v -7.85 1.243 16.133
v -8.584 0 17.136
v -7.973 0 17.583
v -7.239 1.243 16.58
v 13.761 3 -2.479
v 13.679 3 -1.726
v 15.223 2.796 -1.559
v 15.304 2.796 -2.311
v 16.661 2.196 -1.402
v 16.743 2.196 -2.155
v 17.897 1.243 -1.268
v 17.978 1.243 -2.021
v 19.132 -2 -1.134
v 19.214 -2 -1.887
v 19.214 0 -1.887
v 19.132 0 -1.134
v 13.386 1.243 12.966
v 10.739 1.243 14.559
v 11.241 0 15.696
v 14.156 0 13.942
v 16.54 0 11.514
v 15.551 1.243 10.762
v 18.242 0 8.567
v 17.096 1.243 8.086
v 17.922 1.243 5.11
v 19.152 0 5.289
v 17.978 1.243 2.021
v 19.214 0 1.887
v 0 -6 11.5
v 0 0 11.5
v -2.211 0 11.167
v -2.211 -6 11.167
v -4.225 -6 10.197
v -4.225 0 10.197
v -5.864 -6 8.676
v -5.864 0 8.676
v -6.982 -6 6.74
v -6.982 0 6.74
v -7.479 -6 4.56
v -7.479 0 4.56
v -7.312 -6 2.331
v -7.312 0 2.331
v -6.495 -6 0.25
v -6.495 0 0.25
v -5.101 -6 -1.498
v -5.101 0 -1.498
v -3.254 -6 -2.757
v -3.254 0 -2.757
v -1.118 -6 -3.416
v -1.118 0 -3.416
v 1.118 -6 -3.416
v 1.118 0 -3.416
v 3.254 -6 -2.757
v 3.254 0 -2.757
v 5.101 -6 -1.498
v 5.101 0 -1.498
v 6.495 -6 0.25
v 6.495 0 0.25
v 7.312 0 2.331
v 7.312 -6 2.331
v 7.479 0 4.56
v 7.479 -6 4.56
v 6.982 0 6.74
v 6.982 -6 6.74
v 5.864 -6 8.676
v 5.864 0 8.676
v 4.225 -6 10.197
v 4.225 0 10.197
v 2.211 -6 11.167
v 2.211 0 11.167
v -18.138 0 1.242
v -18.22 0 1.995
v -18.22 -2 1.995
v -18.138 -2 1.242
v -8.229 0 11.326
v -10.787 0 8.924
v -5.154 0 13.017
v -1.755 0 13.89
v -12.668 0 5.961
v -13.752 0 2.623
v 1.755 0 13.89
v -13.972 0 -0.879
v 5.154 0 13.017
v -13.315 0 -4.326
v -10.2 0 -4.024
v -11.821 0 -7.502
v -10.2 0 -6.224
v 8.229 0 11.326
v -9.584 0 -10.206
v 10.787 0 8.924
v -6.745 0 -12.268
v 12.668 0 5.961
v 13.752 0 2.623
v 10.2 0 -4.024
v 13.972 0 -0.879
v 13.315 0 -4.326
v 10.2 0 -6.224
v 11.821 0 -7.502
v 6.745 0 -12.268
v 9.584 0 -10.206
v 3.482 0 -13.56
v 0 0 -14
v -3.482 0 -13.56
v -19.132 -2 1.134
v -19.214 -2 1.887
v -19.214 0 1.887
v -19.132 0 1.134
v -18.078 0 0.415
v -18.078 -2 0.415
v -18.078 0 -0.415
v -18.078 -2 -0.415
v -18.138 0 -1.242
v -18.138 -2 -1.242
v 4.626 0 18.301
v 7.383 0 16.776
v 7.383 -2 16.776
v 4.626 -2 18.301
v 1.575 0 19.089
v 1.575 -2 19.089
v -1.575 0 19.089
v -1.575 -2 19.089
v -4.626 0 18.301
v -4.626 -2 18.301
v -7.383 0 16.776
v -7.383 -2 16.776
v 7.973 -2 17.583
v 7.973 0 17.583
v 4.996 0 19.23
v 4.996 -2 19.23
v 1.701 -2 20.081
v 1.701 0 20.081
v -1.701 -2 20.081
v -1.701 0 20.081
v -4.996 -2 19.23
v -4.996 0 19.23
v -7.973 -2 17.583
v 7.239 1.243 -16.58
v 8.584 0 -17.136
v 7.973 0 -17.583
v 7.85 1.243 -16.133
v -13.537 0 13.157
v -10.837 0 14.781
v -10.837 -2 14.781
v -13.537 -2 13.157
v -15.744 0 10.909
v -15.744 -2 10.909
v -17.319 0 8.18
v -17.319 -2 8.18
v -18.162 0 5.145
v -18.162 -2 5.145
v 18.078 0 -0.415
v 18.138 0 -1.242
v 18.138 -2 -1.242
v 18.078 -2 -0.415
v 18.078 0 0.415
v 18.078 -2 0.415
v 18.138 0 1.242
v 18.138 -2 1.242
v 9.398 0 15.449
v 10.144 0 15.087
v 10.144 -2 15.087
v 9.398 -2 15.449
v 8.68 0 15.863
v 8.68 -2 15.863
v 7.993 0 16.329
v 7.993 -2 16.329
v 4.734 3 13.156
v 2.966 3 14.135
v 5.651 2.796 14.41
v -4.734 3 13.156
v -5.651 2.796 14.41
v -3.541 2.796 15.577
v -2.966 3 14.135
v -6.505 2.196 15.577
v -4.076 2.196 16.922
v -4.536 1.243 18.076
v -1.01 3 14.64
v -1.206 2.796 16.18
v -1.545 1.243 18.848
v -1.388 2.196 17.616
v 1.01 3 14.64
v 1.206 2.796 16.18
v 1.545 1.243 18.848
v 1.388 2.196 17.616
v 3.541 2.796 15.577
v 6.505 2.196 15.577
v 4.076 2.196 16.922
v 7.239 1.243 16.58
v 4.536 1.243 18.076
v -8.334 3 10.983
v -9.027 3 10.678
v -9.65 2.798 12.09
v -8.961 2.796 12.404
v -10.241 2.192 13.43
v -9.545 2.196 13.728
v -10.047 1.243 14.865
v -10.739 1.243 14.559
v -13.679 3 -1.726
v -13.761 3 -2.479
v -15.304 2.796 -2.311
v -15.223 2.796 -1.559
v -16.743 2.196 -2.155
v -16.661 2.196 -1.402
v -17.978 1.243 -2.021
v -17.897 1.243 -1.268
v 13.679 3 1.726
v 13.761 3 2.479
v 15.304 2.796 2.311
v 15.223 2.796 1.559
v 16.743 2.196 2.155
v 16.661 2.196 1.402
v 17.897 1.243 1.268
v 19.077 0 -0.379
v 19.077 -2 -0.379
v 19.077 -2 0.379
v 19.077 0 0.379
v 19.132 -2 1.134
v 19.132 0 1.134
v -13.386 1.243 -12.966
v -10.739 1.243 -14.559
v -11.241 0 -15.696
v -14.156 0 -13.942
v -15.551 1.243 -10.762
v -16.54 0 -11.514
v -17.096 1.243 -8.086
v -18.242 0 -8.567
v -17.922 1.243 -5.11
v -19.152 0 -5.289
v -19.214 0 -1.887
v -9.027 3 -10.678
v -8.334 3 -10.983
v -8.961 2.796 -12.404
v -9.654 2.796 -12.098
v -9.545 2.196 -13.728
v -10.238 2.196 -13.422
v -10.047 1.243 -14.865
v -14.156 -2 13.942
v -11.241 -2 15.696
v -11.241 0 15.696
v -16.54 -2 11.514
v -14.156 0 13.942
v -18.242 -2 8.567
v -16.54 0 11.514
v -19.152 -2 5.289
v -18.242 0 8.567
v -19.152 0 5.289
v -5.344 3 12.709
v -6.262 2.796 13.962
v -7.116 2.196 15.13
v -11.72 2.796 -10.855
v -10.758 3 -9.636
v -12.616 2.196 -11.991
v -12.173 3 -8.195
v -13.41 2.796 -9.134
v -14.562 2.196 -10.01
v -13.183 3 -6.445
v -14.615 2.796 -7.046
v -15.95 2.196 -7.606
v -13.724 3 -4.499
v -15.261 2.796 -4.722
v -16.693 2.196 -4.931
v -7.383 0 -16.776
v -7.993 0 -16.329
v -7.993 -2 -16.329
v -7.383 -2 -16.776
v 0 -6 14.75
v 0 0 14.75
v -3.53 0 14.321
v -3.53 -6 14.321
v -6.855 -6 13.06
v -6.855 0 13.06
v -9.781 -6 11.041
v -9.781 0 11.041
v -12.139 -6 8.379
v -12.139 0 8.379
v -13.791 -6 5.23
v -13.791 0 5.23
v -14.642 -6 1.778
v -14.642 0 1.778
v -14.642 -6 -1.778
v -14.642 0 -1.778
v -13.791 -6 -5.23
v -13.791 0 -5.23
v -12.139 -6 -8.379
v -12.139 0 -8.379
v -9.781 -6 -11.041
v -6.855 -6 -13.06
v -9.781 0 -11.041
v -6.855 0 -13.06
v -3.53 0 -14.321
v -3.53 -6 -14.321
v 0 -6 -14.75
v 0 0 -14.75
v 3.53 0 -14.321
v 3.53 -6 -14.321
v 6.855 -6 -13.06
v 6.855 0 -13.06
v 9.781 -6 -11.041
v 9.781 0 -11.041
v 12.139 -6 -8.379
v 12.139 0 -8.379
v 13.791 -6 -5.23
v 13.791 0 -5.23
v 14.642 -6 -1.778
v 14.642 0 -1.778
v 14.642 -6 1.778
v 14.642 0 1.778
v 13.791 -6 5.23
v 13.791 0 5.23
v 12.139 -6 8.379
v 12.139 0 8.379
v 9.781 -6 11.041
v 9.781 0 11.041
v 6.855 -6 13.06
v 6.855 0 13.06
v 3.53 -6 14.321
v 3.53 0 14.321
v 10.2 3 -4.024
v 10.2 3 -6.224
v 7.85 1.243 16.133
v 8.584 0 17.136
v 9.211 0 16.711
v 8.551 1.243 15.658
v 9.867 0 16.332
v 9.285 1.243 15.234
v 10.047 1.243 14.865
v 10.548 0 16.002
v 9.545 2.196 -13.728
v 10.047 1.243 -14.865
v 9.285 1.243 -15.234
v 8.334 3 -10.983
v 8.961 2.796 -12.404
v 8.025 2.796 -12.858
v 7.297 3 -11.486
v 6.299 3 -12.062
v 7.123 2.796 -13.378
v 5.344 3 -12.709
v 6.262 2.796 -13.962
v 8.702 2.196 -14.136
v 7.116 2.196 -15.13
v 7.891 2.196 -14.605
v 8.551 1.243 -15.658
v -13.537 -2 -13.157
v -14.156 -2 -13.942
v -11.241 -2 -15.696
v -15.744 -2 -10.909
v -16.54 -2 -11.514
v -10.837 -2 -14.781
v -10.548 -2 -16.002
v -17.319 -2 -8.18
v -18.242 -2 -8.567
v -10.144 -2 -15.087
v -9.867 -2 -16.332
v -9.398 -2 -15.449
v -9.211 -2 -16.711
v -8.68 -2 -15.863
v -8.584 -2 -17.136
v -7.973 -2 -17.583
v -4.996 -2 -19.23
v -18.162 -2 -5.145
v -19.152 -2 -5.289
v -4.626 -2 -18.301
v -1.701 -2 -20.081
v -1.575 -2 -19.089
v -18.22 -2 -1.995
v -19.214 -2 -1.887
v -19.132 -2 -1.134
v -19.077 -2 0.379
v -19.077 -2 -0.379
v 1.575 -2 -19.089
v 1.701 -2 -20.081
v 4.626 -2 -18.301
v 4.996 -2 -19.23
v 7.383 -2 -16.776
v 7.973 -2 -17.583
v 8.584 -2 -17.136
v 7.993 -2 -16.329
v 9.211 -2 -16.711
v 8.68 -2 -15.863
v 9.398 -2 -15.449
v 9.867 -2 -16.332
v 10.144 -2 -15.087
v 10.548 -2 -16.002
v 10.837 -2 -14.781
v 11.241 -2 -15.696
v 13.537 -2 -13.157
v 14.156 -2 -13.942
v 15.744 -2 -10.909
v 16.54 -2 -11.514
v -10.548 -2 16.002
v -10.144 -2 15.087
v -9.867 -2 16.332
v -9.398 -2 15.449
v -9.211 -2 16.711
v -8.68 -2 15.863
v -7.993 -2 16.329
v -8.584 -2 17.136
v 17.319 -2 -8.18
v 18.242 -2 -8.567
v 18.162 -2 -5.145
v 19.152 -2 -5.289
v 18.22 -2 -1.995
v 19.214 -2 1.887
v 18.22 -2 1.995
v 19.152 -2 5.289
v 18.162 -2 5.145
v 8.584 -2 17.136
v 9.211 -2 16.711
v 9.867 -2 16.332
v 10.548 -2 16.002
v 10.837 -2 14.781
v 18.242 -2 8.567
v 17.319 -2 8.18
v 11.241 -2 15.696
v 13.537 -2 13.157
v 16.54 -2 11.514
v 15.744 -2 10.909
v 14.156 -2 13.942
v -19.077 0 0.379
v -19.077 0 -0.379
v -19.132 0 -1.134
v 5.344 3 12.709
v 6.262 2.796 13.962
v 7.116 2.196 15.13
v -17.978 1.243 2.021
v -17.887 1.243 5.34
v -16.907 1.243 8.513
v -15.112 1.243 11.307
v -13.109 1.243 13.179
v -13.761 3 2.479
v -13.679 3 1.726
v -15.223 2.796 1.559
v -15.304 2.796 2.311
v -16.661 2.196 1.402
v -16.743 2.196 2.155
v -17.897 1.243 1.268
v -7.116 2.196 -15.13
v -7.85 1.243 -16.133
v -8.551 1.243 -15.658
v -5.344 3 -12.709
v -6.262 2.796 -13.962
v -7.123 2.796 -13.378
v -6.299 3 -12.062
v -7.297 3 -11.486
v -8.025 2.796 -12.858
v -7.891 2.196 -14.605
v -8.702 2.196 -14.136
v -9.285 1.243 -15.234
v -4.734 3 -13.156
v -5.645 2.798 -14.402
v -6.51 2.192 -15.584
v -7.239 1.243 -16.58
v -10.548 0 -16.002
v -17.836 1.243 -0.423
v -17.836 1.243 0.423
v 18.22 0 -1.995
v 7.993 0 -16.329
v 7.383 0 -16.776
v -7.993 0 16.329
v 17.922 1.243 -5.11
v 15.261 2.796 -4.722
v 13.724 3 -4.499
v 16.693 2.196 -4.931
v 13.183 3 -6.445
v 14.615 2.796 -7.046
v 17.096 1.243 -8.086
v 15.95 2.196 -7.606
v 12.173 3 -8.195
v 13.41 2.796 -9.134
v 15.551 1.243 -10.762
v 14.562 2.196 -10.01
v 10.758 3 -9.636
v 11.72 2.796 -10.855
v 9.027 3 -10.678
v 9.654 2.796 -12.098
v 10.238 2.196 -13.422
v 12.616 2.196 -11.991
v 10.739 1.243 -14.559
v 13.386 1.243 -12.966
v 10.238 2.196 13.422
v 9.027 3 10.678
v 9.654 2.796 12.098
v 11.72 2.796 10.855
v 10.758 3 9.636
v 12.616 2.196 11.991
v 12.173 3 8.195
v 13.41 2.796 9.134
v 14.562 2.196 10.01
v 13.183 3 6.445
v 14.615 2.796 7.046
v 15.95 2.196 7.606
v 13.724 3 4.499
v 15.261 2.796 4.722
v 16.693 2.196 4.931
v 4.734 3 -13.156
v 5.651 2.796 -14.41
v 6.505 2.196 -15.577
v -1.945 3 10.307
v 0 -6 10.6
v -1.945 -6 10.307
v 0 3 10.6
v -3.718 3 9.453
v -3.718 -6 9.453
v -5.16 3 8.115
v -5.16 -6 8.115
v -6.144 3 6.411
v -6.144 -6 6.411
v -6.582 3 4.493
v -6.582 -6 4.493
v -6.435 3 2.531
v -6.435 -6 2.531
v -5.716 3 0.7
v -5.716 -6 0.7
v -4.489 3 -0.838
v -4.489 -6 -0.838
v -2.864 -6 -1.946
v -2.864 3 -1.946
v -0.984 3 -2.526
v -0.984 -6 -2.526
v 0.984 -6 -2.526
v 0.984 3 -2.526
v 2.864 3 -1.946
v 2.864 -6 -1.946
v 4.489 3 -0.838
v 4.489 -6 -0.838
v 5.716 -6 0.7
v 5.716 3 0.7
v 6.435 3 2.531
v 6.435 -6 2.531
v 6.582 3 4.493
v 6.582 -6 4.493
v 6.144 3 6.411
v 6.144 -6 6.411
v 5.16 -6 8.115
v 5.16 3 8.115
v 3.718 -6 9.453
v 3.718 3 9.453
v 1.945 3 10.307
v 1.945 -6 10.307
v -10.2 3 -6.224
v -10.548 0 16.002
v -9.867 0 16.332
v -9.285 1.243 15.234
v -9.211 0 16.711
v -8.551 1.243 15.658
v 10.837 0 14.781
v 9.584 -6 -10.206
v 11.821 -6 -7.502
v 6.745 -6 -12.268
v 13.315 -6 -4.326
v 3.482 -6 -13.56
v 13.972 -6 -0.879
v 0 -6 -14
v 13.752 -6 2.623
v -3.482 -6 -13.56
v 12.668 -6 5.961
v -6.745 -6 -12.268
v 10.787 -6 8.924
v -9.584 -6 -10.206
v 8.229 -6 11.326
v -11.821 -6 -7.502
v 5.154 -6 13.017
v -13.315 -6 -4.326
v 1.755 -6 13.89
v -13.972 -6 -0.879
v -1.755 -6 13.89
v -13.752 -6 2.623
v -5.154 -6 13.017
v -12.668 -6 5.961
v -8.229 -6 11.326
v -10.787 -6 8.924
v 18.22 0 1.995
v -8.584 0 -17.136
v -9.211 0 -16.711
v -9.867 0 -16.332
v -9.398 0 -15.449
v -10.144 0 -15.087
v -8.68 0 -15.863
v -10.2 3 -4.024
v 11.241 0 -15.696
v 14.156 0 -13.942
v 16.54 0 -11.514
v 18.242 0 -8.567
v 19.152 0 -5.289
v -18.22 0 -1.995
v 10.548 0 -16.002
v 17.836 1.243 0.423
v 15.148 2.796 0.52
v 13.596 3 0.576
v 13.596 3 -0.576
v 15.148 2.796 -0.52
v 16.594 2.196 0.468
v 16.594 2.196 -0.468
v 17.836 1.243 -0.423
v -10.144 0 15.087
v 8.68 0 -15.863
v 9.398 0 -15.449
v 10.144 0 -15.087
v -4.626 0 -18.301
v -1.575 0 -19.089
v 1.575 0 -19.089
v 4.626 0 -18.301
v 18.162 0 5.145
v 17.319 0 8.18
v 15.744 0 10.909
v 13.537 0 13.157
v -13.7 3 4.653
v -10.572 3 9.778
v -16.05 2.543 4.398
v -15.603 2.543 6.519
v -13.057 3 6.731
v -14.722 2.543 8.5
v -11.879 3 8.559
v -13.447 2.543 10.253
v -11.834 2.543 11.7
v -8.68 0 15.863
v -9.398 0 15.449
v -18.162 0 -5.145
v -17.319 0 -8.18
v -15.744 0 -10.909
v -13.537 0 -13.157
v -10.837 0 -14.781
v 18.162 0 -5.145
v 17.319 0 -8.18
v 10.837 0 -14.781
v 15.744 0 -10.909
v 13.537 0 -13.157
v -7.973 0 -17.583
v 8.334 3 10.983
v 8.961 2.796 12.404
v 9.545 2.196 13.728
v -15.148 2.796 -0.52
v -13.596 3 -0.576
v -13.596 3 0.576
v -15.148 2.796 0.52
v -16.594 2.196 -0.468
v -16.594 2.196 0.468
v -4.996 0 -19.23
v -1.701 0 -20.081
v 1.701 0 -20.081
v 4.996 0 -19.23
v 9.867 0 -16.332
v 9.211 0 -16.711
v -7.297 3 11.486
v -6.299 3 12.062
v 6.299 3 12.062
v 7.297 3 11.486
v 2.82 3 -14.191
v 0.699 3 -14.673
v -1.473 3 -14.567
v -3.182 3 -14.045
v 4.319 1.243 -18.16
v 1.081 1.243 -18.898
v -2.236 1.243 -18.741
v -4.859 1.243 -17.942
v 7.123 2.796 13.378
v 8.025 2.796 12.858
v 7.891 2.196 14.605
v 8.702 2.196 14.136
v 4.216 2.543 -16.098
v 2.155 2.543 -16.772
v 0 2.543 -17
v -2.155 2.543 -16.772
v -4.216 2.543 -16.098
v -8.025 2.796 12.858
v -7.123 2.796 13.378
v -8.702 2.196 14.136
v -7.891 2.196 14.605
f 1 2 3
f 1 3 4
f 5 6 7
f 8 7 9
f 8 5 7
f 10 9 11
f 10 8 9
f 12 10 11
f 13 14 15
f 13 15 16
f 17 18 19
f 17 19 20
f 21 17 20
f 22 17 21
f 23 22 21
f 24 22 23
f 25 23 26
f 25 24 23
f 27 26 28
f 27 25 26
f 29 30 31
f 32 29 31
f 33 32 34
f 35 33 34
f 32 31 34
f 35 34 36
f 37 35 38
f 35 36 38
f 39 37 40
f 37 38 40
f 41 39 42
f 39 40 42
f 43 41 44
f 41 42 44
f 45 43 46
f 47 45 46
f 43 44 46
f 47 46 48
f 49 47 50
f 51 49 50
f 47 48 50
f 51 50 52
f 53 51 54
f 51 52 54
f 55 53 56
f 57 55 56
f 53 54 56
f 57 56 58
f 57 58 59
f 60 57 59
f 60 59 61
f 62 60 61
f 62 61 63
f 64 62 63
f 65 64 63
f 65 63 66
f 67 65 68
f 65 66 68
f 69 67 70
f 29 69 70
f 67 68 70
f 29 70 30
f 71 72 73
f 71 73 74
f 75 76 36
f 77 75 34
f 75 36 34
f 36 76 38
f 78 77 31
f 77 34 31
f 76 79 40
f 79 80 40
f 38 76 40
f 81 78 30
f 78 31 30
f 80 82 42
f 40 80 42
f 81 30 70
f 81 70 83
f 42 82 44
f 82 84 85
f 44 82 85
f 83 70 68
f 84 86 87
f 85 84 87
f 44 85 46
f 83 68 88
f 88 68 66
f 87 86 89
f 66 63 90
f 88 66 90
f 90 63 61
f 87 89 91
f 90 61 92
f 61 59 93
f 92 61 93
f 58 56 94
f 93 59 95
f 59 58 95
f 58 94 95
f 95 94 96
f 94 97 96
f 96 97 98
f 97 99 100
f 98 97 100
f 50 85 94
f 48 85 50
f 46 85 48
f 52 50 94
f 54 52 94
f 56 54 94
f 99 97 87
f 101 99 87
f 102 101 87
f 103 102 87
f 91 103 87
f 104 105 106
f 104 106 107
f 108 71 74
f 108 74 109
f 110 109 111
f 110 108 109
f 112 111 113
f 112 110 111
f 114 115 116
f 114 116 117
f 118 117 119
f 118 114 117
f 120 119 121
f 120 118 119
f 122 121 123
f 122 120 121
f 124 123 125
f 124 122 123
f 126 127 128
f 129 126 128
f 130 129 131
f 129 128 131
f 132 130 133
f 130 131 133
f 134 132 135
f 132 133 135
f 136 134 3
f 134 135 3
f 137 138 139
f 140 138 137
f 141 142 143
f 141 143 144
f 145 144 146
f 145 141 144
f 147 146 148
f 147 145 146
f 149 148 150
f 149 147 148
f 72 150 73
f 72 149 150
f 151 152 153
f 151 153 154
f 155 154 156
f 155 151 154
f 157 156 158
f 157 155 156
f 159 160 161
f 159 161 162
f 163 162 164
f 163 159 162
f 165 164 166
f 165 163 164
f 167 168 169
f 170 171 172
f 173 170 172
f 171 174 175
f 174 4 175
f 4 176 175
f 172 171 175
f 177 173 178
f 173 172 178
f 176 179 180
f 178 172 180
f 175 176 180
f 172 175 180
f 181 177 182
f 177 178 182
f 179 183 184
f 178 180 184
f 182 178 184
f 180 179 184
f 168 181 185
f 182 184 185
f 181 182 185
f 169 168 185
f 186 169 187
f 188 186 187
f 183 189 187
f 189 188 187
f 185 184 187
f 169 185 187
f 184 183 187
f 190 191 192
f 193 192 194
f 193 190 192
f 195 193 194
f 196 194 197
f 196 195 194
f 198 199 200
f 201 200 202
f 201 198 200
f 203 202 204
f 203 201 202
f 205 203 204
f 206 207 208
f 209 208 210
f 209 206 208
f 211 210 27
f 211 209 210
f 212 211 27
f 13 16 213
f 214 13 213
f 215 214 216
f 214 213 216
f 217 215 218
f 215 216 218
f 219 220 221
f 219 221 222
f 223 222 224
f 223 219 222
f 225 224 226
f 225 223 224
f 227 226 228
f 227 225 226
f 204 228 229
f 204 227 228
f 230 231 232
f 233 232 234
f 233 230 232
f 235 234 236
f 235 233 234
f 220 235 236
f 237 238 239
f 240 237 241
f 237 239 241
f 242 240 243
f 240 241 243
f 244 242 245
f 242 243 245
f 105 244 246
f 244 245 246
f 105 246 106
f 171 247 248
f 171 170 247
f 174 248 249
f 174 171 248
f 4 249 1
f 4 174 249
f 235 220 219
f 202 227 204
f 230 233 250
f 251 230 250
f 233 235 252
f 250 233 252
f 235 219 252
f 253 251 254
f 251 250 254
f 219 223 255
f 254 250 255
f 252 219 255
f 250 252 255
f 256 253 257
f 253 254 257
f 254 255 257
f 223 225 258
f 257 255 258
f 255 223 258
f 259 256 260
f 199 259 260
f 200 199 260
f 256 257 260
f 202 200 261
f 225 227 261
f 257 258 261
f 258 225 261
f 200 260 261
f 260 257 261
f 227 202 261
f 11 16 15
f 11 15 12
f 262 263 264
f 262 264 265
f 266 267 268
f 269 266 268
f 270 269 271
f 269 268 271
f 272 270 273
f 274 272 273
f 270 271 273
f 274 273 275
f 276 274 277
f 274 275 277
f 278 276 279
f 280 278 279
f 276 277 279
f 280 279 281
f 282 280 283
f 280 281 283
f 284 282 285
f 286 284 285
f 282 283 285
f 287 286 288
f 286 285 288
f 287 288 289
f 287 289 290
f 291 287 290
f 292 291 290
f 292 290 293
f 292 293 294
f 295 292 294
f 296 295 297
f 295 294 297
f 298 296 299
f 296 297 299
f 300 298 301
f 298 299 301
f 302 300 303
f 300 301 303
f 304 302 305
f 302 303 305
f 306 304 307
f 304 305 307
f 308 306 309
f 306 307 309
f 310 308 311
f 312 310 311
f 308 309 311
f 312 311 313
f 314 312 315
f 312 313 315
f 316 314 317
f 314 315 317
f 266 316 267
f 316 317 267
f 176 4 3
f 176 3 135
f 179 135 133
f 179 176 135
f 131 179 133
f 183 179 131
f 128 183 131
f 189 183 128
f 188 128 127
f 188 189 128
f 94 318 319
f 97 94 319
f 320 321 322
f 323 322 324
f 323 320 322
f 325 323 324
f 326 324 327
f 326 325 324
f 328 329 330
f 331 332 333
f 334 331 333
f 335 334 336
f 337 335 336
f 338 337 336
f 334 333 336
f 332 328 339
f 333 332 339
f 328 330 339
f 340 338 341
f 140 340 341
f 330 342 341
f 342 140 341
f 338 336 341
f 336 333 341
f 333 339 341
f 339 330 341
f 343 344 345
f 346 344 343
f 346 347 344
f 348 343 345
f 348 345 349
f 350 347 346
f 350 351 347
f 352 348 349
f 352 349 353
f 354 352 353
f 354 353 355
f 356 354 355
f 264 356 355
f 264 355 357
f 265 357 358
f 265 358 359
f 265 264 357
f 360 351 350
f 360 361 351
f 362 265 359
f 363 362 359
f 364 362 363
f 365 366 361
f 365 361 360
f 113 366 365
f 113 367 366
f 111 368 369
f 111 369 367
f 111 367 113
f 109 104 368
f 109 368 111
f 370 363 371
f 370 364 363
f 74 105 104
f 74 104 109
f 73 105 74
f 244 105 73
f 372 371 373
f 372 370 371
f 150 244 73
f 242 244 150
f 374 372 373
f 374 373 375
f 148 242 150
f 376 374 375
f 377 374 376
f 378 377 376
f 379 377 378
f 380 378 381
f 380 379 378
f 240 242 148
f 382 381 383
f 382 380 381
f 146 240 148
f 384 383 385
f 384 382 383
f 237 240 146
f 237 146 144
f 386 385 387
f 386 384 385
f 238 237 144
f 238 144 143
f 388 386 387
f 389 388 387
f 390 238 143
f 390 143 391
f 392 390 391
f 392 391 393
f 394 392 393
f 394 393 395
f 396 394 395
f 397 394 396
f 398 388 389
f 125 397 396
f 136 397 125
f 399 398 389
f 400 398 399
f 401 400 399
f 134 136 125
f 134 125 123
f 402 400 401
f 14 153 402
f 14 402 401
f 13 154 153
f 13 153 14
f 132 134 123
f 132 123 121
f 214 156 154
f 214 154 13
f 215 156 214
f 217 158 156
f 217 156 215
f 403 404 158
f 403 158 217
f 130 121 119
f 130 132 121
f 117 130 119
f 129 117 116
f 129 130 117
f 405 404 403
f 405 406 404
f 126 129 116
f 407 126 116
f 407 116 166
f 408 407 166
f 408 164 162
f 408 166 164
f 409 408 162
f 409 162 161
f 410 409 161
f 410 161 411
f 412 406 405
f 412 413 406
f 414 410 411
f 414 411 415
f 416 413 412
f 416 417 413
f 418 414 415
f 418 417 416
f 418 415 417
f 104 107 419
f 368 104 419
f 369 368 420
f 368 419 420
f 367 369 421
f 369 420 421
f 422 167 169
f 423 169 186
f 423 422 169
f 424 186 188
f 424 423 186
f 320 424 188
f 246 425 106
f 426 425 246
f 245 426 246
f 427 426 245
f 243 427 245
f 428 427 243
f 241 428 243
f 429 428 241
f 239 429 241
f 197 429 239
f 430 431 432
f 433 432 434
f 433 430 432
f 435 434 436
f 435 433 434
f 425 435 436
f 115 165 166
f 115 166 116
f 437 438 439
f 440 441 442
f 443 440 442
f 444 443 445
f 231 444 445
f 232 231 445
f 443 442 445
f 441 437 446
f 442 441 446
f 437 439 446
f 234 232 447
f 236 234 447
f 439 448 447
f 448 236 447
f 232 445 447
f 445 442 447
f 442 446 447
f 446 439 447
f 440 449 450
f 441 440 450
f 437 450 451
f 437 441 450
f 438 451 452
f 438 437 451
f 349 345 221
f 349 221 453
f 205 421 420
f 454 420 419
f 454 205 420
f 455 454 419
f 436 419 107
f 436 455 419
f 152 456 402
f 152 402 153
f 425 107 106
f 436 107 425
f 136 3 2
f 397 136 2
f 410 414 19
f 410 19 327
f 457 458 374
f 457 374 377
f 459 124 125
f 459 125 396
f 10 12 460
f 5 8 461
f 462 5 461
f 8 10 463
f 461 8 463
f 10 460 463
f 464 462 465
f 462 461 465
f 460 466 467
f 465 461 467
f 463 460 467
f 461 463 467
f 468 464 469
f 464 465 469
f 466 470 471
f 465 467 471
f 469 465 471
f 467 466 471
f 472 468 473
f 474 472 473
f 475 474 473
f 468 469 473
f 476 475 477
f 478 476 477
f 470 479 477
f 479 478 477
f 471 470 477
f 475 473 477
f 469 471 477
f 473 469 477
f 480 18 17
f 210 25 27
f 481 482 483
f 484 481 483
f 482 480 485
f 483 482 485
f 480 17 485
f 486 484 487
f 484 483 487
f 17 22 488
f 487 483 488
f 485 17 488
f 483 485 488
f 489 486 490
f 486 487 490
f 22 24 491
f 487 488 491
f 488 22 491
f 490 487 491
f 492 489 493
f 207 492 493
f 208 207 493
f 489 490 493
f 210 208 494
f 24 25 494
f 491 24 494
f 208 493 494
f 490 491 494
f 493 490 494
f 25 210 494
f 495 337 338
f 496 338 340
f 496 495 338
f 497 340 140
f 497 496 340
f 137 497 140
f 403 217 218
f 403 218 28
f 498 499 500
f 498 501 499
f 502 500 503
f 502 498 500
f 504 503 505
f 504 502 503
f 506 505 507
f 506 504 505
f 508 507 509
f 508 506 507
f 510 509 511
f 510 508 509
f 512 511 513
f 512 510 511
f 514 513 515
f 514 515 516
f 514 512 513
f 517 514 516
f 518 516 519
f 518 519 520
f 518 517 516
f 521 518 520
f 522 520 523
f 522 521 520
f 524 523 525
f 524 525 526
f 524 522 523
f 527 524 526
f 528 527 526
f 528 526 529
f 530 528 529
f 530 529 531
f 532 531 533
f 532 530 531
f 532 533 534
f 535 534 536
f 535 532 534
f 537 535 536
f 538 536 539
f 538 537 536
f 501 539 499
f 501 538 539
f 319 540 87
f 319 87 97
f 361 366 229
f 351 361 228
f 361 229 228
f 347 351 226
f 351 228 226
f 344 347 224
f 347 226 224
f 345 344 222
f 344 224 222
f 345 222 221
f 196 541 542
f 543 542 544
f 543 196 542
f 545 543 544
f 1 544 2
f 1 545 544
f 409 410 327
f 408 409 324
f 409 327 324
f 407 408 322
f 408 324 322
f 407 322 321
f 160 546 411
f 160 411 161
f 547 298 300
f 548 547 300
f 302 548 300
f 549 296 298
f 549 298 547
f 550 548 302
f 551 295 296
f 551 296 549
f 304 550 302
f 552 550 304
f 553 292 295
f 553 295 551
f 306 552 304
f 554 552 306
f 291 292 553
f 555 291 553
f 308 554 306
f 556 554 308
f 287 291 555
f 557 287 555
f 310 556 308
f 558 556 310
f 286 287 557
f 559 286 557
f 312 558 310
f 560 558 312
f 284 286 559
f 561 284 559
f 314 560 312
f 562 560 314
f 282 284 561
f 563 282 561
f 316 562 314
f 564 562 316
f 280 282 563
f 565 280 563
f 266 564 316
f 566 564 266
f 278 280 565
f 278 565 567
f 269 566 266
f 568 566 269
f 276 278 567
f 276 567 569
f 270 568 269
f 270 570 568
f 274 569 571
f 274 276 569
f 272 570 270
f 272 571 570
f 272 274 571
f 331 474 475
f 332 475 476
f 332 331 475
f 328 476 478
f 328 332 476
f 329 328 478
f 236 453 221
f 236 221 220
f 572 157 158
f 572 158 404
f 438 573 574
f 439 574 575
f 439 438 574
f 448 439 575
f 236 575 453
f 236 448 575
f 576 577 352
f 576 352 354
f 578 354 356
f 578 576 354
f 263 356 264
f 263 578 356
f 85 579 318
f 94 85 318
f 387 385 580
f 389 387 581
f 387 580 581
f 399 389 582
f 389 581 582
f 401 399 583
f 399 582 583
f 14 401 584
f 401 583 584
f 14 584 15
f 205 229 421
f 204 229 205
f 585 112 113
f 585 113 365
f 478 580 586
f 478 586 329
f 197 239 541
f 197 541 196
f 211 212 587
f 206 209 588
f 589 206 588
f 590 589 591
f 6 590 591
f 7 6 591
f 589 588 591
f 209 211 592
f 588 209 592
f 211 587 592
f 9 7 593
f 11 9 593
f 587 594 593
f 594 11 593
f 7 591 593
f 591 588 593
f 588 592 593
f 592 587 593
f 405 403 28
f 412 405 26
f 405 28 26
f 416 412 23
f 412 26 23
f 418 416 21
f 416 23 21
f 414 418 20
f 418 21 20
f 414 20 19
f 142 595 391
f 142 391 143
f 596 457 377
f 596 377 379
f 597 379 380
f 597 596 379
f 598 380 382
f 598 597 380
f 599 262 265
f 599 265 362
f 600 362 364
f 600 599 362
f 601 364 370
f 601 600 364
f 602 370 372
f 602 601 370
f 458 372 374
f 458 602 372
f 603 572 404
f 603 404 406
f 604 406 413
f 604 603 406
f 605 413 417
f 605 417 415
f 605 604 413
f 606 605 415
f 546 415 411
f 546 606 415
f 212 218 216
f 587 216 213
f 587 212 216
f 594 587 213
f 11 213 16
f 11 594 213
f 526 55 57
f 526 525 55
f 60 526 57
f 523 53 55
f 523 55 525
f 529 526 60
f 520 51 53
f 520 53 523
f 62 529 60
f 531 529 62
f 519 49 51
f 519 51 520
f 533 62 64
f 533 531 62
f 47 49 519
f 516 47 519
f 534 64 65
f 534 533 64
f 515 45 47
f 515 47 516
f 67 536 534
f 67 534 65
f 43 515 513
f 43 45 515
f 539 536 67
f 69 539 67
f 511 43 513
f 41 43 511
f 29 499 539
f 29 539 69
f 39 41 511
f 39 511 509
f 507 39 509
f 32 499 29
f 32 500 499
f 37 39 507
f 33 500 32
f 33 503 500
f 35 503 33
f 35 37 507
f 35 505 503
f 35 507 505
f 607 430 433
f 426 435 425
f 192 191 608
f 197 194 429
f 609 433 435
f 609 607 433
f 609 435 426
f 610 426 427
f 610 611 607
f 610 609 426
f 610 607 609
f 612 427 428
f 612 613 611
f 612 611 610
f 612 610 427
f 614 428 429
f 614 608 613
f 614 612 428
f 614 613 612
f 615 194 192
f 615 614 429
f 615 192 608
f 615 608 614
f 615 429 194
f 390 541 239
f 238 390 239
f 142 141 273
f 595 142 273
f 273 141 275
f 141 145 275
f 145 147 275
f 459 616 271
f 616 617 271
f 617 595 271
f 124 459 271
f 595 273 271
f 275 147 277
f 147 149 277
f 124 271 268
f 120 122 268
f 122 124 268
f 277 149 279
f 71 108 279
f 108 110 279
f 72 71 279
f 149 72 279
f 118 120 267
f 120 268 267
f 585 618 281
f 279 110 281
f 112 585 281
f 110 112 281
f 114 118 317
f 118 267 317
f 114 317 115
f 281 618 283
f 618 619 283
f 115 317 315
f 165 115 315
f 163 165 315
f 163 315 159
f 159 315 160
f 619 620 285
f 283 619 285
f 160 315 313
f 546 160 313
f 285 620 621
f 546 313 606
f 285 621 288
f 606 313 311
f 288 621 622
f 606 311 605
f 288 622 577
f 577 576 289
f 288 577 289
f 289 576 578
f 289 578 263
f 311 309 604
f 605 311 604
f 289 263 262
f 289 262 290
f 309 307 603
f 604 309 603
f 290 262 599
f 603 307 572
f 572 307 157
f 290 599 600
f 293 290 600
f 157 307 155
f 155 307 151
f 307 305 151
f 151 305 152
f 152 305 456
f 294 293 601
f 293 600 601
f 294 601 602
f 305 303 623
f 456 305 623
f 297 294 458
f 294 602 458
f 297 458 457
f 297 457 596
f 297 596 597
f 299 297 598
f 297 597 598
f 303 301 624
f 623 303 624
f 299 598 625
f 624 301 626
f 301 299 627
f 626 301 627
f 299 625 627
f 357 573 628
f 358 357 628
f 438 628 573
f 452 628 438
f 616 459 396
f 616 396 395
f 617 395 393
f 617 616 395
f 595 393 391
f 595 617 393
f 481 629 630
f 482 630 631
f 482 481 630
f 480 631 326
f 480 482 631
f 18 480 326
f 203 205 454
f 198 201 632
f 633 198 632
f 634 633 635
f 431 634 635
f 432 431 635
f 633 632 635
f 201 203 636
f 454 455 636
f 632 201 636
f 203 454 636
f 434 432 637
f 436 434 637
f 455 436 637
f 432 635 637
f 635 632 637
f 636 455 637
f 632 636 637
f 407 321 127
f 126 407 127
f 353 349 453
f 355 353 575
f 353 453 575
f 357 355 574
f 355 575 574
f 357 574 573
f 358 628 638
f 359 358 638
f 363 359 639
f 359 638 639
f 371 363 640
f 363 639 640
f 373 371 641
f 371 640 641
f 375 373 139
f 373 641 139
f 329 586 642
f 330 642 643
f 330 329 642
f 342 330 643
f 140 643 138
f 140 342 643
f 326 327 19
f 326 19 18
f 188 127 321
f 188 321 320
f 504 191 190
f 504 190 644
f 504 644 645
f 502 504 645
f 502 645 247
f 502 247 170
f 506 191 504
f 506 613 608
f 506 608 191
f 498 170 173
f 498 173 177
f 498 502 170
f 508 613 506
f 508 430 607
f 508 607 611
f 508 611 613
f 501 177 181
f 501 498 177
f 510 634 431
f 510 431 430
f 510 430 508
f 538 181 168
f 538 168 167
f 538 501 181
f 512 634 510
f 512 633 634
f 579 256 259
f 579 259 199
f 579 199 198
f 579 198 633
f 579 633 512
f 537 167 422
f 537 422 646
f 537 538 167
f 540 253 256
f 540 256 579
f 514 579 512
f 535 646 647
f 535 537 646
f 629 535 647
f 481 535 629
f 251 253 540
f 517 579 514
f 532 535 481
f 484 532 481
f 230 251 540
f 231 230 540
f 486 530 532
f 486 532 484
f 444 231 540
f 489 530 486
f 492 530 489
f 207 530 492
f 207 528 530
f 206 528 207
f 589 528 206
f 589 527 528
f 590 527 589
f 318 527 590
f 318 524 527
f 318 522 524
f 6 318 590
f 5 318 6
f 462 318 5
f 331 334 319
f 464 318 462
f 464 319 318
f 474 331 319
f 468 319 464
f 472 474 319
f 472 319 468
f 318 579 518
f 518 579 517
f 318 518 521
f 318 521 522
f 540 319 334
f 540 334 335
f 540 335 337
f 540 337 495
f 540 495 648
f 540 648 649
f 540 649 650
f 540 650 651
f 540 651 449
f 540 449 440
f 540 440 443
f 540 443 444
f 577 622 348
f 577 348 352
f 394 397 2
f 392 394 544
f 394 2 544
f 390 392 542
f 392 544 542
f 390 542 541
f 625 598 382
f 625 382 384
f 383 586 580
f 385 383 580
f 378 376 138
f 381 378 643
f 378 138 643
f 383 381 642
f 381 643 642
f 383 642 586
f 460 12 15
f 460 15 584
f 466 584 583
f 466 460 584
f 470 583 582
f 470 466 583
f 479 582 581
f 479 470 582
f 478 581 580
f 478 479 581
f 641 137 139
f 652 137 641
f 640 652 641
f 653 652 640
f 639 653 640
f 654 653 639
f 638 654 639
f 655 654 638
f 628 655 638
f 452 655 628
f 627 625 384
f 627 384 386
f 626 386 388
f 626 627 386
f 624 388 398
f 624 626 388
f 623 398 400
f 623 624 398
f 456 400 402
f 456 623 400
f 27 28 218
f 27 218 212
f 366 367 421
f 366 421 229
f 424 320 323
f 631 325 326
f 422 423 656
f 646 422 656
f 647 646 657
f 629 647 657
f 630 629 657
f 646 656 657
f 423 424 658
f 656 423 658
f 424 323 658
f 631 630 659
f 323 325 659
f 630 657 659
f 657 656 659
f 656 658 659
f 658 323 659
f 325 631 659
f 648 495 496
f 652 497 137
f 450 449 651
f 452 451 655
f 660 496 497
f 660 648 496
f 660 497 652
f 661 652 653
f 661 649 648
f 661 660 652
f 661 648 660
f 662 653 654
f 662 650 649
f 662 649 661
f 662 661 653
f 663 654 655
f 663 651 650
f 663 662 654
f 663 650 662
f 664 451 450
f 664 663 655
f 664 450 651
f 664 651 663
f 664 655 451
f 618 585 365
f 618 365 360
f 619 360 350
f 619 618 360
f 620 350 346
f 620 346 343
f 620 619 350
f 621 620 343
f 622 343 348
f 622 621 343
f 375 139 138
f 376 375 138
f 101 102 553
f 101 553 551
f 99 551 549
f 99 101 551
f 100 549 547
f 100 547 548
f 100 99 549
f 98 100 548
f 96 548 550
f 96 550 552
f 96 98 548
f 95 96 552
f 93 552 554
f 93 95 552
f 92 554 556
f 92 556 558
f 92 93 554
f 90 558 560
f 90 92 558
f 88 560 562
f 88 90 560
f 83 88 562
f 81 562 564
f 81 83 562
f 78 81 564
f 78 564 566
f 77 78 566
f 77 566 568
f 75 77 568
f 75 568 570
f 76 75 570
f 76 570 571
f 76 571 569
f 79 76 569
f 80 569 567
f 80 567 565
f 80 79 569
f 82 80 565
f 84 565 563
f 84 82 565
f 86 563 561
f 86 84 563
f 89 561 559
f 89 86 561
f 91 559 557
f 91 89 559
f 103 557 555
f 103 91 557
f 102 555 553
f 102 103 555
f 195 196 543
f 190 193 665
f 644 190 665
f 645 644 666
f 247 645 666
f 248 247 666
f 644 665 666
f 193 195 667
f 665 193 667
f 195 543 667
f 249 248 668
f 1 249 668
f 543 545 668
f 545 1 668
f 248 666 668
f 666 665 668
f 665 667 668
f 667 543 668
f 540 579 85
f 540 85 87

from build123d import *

# Parameters (mm, degrees)
EXTRUDE_1_DEPTH     = 3
CHAMFER_1_SIZE      = 4.5
SKETCH_3_R          = 14.75
SKETCH_3_R_2        = 14
EXTRUDE_2_DEPTH     = 6
FILLET_1_R          = 6
SKETCH_4_R          = 6.6
SKETCH_4_W          = 20.4
SKETCH_4_H          = 2.2
CUT_EXTRUDE_1_DEPTH = 10
SKETCH_5_R          = 7.5
SKETCH_5_R_2        = 6.6
EXTRUDE_3_DEPTH     = 6
EXTRUDE_4_DEPTH     = 2


with BuildPart() as part:
    # 草圖1 → 填料-伸長1 (new body)
    with BuildSketch(Plane(origin=(0, 0, 0), x_dir=(1, 0, 0), z_dir=(0, 1, 0))):
        with BuildLine():
            Line((-20.704980807, 1.724517645), (-20.623229371, 0.971941941))
            ThreePointArc((-20.623229371, 0.971941941), (-20.570593724, 0), (-20.623229371, -0.971941941))
            Line((-20.623229371, -0.971941941), (-20.704980807, -1.724517645))
            ThreePointArc((-20.704980807, -1.724517645), (-18.783087943, -10.84442088), (-11.845966493, -17.068780542))
            Line((-11.845966493, -17.068780542), (-11.153341097, -17.374269573))
            ThreePointArc((-11.153341097, -17.374269573), (-10.285296862, -17.814656736), (-9.469888273, -18.346211514))
            Line((-9.469888273, -18.346211514), (-8.859014314, -18.793298186))
            ThreePointArc((-8.859014314, -18.793298186), (0, -21.68884176), (8.859014314, -18.793298186))
            Line((8.859014314, -18.793298186), (9.469888273, -18.346211514))
            ThreePointArc((9.469888273, -18.346211514), (10.285296862, -17.814656736), (11.153341097, -17.374269573))
            Line((11.153341097, -17.374269573), (11.845966493, -17.068780542))
            ThreePointArc((11.845966493, -17.068780542), (18.783087943, -10.84442088), (20.704980807, -1.724517645))
            Line((20.704980807, -1.724517645), (20.623229371, -0.971941941))
            ThreePointArc((20.623229371, -0.971941941), (20.570593724, 0), (20.623229371, 0.971941941))
            Line((20.623229371, 0.971941941), (20.704980807, 1.724517645))
            ThreePointArc((20.704980807, 1.724517645), (18.783087943, 10.84442088), (11.845966493, 17.068780542))
            Line((11.845966493, 17.068780542), (11.153341097, 17.374269573))
            ThreePointArc((11.153341097, 17.374269573), (10.285296862, 17.814656736), (9.469888273, 18.346211514))
            Line((9.469888273, 18.346211514), (8.859014314, 18.793298186))
            ThreePointArc((8.859014314, 18.793298186), (0, 21.68884176), (-8.859014314, 18.793298186))
            Line((-8.859014314, 18.793298186), (-9.469888273, 18.346211514))
            ThreePointArc((-9.469888273, 18.346211514), (-10.285296862, 17.814656736), (-11.153341097, 17.374269573))
            Line((-11.153341097, 17.374269573), (-11.845966493, 17.068780542))
            ThreePointArc((-11.845966493, 17.068780542), (-18.783087943, 10.84442088), (-20.704980807, 1.724517645))
        make_face()
    extrude(amount=EXTRUDE_1_DEPTH)

    # 導角1
    # the kernel refuses this chamfer: 4.5 mm, written as the material it takes off along each edge
    with BuildSketch(Plane(origin=(0, 3, -6.68884176), x_dir=(0.5906009542707515, 0, -0.806963761772781), z_dir=(0.806963761772781, 0, 0.5906009542707515))) as chamfer_1_piece_1:
        Polygon((15, -CHAMFER_1_SIZE), (15 - CHAMFER_1_SIZE, 0), (15, 0), align=None)
    revolve(axis=Axis((0, 3, -6.68884176), (0, 1, 0)), revolution_arc=72.399330687, mode=Mode.SUBTRACT)
    with BuildSketch(Plane(origin=(-8.859014314, 3, -18.793298186), x_dir=(-0.01623909096472242, -0.9996219169112969, -0.022188176022919864), z_dir=(-0.8069637617728046, 0, 0.5906009542707192)), Plane(origin=(9.469888273, 3, -18.346211514), x_dir=(0.016239090964723243, -0.9996219169112966, -0.02218817602291905), z_dir=(-0.80696376177278, 0, -0.590600954270753)), Plane(origin=(-11.153341097, 3, -17.374269573), x_dir=(-0.011095978617127196, -0.9996219169112966, -0.025157553321276), z_dir=(-0.9149573107841905, 0, 0.4035506404933121)), Plane(origin=(11.845966493, 3, -17.068780542), x_dir=(0.01109597861712818, -0.9996219169112969, -0.025157553321275908), z_dir=(-0.9149573107841767, 0, -0.4035506404933432)), Plane(origin=(-20.704980807, 3, -1.724517645), x_dir=(-0.027335069581850155, -0.9996219169112966, 0.002969377298356834), z_dir=(0.10799354901140278, 0, 0.994151594764059)), Plane(origin=(20.623229371, 3, -0.971941941), x_dir=(0.027335069581850155, -0.9996219169112966, 0.002969377298356732), z_dir=(0.10799354901139908, 0, -0.9941515947640595)), Plane(origin=(-20.623229371, 3, 0.971941941), x_dir=(-0.027335069581850155, -0.9996219169112966, -0.0029693772983569343), z_dir=(-0.10799354901140637, 0, 0.9941515947640586)), Plane(origin=(20.704980807, 3, 1.724517645), x_dir=(0.027335069581850162, -0.9996219169112966, -0.0029693772983558834), z_dir=(-0.10799354901136858, 0, -0.9941515947640628)), Plane(origin=(-11.845966493, 3, 17.068780542), x_dir=(-0.011095978617126995, -0.9996219169112966, 0.025157553321276088), z_dir=(0.9149573107841937, 0, 0.40355064049330475)), Plane(origin=(11.153341097, 3, 17.374269573), x_dir=(0.01109597861712765, -0.9996219169112969, 0.025157553321275974), z_dir=(0.9149573107841842, 0, -0.40355064049332623)), Plane(origin=(-9.469888273, 3, 18.346211514), x_dir=(-0.016239090964723056, -0.9996219169112966, 0.022188176022919188), z_dir=(0.8069637617727851, 0, 0.5906009542707462)), Plane(origin=(8.859014314, 3, 18.793298186), x_dir=(0.016239090964721894, -0.9996219169112969, 0.022188176022919965), z_dir=(0.8069637617728149, 0, -0.5906009542707051))) as chamfer_1_piece_2:
        Polygon((CHAMFER_1_SIZE * 0.999621916911, CHAMFER_1_SIZE * 0.0274958766106), (-CHAMFER_1_SIZE * 0.0274958766106, CHAMFER_1_SIZE * 0.999621916911), (0, 0), align=None)
    extrude(amount=0.757002964, mode=Mode.SUBTRACT)
    with BuildSketch(Plane(origin=(-14.785296862, 3, -25.60888537), x_dir=(0.5906009542707458, 0, 0.8069637617727853), z_dir=(0.8069637617727853, 0, -0.5906009542707458))) as chamfer_1_piece_3:
        Polygon((9, CHAMFER_1_SIZE), (9 + CHAMFER_1_SIZE, 0), (9, 0), align=None)
    revolve(axis=Axis((-14.785296862, 3, -25.60888537), (0, -1, 0)), revolution_arc=12.399330687, mode=Mode.SUBTRACT)
    with BuildSketch(Plane(origin=(14.785296862, 3, -25.60888537), x_dir=(-0.4035506404933164, 0, 0.9149573107841885), z_dir=(0.9149573107841885, 0, 0.4035506404933164))) as chamfer_1_piece_4:
        Polygon((9, CHAMFER_1_SIZE), (9 + CHAMFER_1_SIZE, 0), (9, 0), align=None)
    revolve(axis=Axis((14.785296862, 3, -25.60888537), (0, -1, 0)), revolution_arc=12.399330687, mode=Mode.SUBTRACT)
    with BuildSketch(Plane(origin=(-5.792706886, 3, -3.34442088), x_dir=(-0.40355064049330586, 0, -0.9149573107841932), z_dir=(0.9149573107841932, 0, -0.40355064049330586))) as chamfer_1_piece_5:
        Polygon((15, -CHAMFER_1_SIZE), (15 - CHAMFER_1_SIZE, 0), (15, 0), align=None)
    revolve(axis=Axis((-5.792706886, 3, -3.34442088), (0, 1, 0)), revolution_arc=72.399330687, mode=Mode.SUBTRACT)
    with BuildSketch(Plane(origin=(5.792706886, 3, -3.34442088), x_dir=(0.9941515947640585, 0, 0.10799354901140852), z_dir=(-0.10799354901140852, 0, 0.9941515947640585))) as chamfer_1_piece_6:
        Polygon((15, -CHAMFER_1_SIZE), (15 - CHAMFER_1_SIZE, 0), (15, 0), align=None)
    revolve(axis=Axis((5.792706886, 3, -3.34442088), (0, 1, 0)), revolution_arc=72.399330687, mode=Mode.SUBTRACT)
    with BuildSketch(Plane(origin=(-29.570593724, 3, 0), x_dir=(0.994151594764055, 0, -0.10799354901143883), z_dir=(-0.10799354901143883, 0, -0.994151594764055))) as chamfer_1_piece_7:
        Polygon((9, CHAMFER_1_SIZE), (9 + CHAMFER_1_SIZE, 0), (9, 0), align=None)
    revolve(axis=Axis((-29.570593724, 3, 0), (0, -1, 0)), revolution_arc=12.399330687, mode=Mode.SUBTRACT)
    with BuildSketch(Plane(origin=(29.570593724, 3, 0), x_dir=(-0.9941515947640606, 0, 0.10799354901138845), z_dir=(0.10799354901138845, 0, 0.9941515947640606))) as chamfer_1_piece_8:
        Polygon((9, CHAMFER_1_SIZE), (9 + CHAMFER_1_SIZE, 0), (9, 0), align=None)
    revolve(axis=Axis((29.570593724, 3, 0), (0, -1, 0)), revolution_arc=12.399330687, mode=Mode.SUBTRACT)
    with BuildSketch(Plane(origin=(-5.792706886, 3, 3.34442088), x_dir=(-0.9941515947640578, 0, -0.10799354901141427), z_dir=(0.10799354901141427, 0, -0.9941515947640578))) as chamfer_1_piece_9:
        Polygon((15, -CHAMFER_1_SIZE), (15 - CHAMFER_1_SIZE, 0), (15, 0), align=None)
    revolve(axis=Axis((-5.792706886, 3, 3.34442088), (0, 1, 0)), revolution_arc=72.399330687, mode=Mode.SUBTRACT)
    with BuildSketch(Plane(origin=(5.792706886, 3, 3.34442088), x_dir=(0.4035506404933115, 0, 0.9149573107841906), z_dir=(-0.9149573107841906, 0, 0.4035506404933115))) as chamfer_1_piece_10:
        Polygon((15, -CHAMFER_1_SIZE), (15 - CHAMFER_1_SIZE, 0), (15, 0), align=None)
    revolve(axis=Axis((5.792706886, 3, 3.34442088), (0, 1, 0)), revolution_arc=72.399330687, mode=Mode.SUBTRACT)
    with BuildSketch(Plane(origin=(-14.785296862, 3, 25.60888537), x_dir=(0.40355064049333084, 0, -0.9149573107841821), z_dir=(-0.9149573107841821, 0, -0.40355064049333084))) as chamfer_1_piece_11:
        Polygon((9, CHAMFER_1_SIZE), (9 + CHAMFER_1_SIZE, 0), (9, 0), align=None)
    revolve(axis=Axis((-14.785296862, 3, 25.60888537), (0, -1, 0)), revolution_arc=12.399330687, mode=Mode.SUBTRACT)
    with BuildSketch(Plane(origin=(14.785296862, 3, 25.60888537), x_dir=(-0.5906009542707462, 0, -0.8069637617727851), z_dir=(-0.8069637617727851, 0, 0.5906009542707462))) as chamfer_1_piece_12:
        Polygon((9, CHAMFER_1_SIZE), (9 + CHAMFER_1_SIZE, 0), (9, 0), align=None)
    revolve(axis=Axis((14.785296862, 3, 25.60888537), (0, -1, 0)), revolution_arc=12.399330687, mode=Mode.SUBTRACT)
    with BuildSketch(Plane(origin=(0, 3, 6.68884176), x_dir=(-0.5906009542707469, 0, 0.8069637617727844), z_dir=(-0.8069637617727844, 0, -0.5906009542707469))) as chamfer_1_piece_13:
        Polygon((15, -CHAMFER_1_SIZE), (15 - CHAMFER_1_SIZE, 0), (15, 0), align=None)
    revolve(axis=Axis((0, 3, 6.68884176), (0, 1, 0)), revolution_arc=72.399330687, mode=Mode.SUBTRACT)

    # 草圖3 → 填料-伸長2 (add)
    with BuildSketch(Plane.XZ):
        with Locations(Location((0, 0, 0), (0, 0, 90))):
            Circle(SKETCH_3_R)
        with Locations(Location((0, 0, 0), (0, 0, 270))):
            Circle(SKETCH_3_R_2, mode=Mode.SUBTRACT)
    extrude(amount=EXTRUDE_2_DEPTH)

    # 圓角1
    fillet_1_edges = [part.edges().sort_by_distance(p)[0] for p in [
        (0, 3, 17.18884176),
        (6.506746999, 3, 14.938417922),
        (-6.506746999, 3, 14.938417922),
        (8.035296862, 3, 13.917542418),
        (-8.035296862, 3, 13.917542418),
        (9.683675913, 3, 13.104217159),
        (-9.683675913, 3, 13.104217159),
        (14.885973626, 3, 8.59442088),
        (-14.885973626, 3, 8.59442088),
        (16.190422913, 3, 1.834200763),
        (-16.190422913, 3, 1.834200763),
        (16.070593724, 3, 0),
        (-16.070593724, 3, 0),
        (16.190422913, 3, -1.834200763),
        (-16.190422913, 3, -1.834200763),
        (14.885973626, 3, -8.59442088),
        (-14.885973626, 3, -8.59442088),
        (9.683675913, 3, -13.104217159),
        (-9.683675913, 3, -13.104217159),
        (8.035296862, 3, -13.917542418),
        (-8.035296862, 3, -13.917542418),
        (6.506746999, 3, -14.938417922),
        (-6.506746999, 3, -14.938417922),
        (0, 3, -17.18884176),
    ]]
    fillet(fillet_1_edges, radius=FILLET_1_R)

    # 草圖4 → 除料-伸長1 (cut)
    with BuildSketch(Plane(origin=(0, 3, 0), x_dir=(1, 0, 0), z_dir=(0, 1, 0))):
        with Locations(Location((0, -4, 0), (0, 0, 270))):
            Circle(SKETCH_4_R)
        with Locations((0, 5.12397969)):
            Rectangle(SKETCH_4_W, SKETCH_4_H)
    extrude(amount=-CUT_EXTRUDE_1_DEPTH, mode=Mode.SUBTRACT)

    # 草圖5 → 填料-伸長3 (add)
    with BuildSketch(Plane.XZ):
        with Locations(Location((0, 4, 0), (0, 0, 90))):
            Circle(SKETCH_5_R)
        with Locations(Location((0, 4, 0), (0, 0, 90))):
            Circle(SKETCH_5_R_2, mode=Mode.SUBTRACT)
    extrude(amount=EXTRUDE_3_DEPTH)

    # 草圖6 → 填料-伸長4 (add)
    with BuildSketch(Plane.XZ):
        with BuildLine():
            Line((-8.583986842, -17.135765871), (-7.973112883, -17.582852544))
            ThreePointArc((-7.973112883, -17.582852544), (0, -20.18884176), (7.973112883, -17.582852544))
            Line((7.973112883, -17.582852544), (8.583986842, -17.135765871))
            ThreePointArc((8.583986842, -17.135765871), (9.535296862, -16.51561863), (10.548015137, -16.001833606))
            Line((10.548015137, -16.001833606), (11.240640533, -15.696344575))
            ThreePointArc((11.240640533, -15.696344575), (17.484049837, -10.09442088), (19.213753415, -1.886507968))
            Line((19.213753415, -1.886507968), (19.132001979, -1.133932265))
            ThreePointArc((19.132001979, -1.133932265), (19.070593724, 0), (19.132001979, 1.133932265))
            Line((19.132001979, 1.133932265), (19.213753415, 1.886507968))
            ThreePointArc((19.213753415, 1.886507968), (17.484049837, 10.09442088), (11.240640533, 15.696344575))
            Line((11.240640533, 15.696344575), (10.548015137, 16.001833606))
            ThreePointArc((10.548015137, 16.001833606), (9.535296862, 16.51561863), (8.583986842, 17.135765871))
            Line((8.583986842, 17.135765871), (7.973112883, 17.582852544))
            ThreePointArc((7.973112883, 17.582852544), (0, 20.18884176), (-7.973112883, 17.582852544))
            Line((-7.973112883, 17.582852544), (-8.583986842, 17.135765871))
            ThreePointArc((-8.583986842, 17.135765871), (-9.535296862, 16.51561863), (-10.548015137, 16.001833606))
            Line((-10.548015137, 16.001833606), (-11.240640533, 15.696344575))
            ThreePointArc((-11.240640533, 15.696344575), (-17.484049837, 10.09442088), (-19.213753415, 1.886507968))
            Line((-19.213753415, 1.886507968), (-19.132001979, 1.133932265))
            ThreePointArc((-19.132001979, 1.133932265), (-19.070593724, 0), (-19.132001979, -1.133932265))
            Line((-19.132001979, -1.133932265), (-19.213753415, -1.886507968))
            ThreePointArc((-19.213753415, -1.886507968), (-17.484049837, -10.09442088), (-11.240640533, -15.696344575))
            Line((-11.240640533, -15.696344575), (-10.548015137, -16.001833606))
            ThreePointArc((-10.548015137, -16.001833606), (-9.535296862, -16.51561863), (-8.583986842, -17.135765871))
        make_face()
        with BuildLine():
            Line((-7.993385888, -16.328802109), (-7.382511928, -16.775888782))
            ThreePointArc((-7.382511928, -16.775888782), (0, -19.18884176), (7.382511928, -16.775888782))
            Line((7.382511928, -16.775888782), (7.993385888, -16.328802109))
            ThreePointArc((7.993385888, -16.328802109), (9.035296862, -15.649593226), (10.144464496, -15.086876296))
            Line((10.144464496, -15.086876296), (10.837089892, -14.781387265))
            ThreePointArc((10.837089892, -14.781387265), (16.618024433, -9.59442088), (18.21960182, -1.994501517))
            Line((18.21960182, -1.994501517), (18.137850384, -1.241925814))
            ThreePointArc((18.137850384, -1.241925814), (18.070593724, 0), (18.137850384, 1.241925814))
            Line((18.137850384, 1.241925814), (18.21960182, 1.994501517))
            ThreePointArc((18.21960182, 1.994501517), (16.618024433, 9.59442088), (10.837089892, 14.781387265))
            Line((10.837089892, 14.781387265), (10.144464496, 15.086876296))
            ThreePointArc((10.144464496, 15.086876296), (9.035296862, 15.649593226), (7.993385888, 16.328802109))
            Line((7.993385888, 16.328802109), (7.382511928, 16.775888782))
            ThreePointArc((7.382511928, 16.775888782), (0, 19.18884176), (-7.382511928, 16.775888782))
            Line((-7.382511928, 16.775888782), (-7.993385888, 16.328802109))
            ThreePointArc((-7.993385888, 16.328802109), (-9.035296862, 15.649593226), (-10.144464496, 15.086876296))
            Line((-10.144464496, 15.086876296), (-10.837089892, 14.781387265))
            ThreePointArc((-10.837089892, 14.781387265), (-16.618024433, 9.59442088), (-18.21960182, 1.994501517))
            Line((-18.21960182, 1.994501517), (-18.137850384, 1.241925814))
            ThreePointArc((-18.137850384, 1.241925814), (-18.070593724, 0), (-18.137850384, -1.241925814))
            Line((-18.137850384, -1.241925814), (-18.21960182, -1.994501517))
            ThreePointArc((-18.21960182, -1.994501517), (-16.618024433, -9.59442088), (-10.837089892, -14.781387265))
            Line((-10.837089892, -14.781387265), (-10.144464496, -15.086876296))
            ThreePointArc((-10.144464496, -15.086876296), (-9.035296862, -15.649593226), (-7.993385888, -16.328802109))
        make_face(mode=Mode.SUBTRACT)
    extrude(amount=EXTRUDE_4_DEPTH)


solid = part.part
